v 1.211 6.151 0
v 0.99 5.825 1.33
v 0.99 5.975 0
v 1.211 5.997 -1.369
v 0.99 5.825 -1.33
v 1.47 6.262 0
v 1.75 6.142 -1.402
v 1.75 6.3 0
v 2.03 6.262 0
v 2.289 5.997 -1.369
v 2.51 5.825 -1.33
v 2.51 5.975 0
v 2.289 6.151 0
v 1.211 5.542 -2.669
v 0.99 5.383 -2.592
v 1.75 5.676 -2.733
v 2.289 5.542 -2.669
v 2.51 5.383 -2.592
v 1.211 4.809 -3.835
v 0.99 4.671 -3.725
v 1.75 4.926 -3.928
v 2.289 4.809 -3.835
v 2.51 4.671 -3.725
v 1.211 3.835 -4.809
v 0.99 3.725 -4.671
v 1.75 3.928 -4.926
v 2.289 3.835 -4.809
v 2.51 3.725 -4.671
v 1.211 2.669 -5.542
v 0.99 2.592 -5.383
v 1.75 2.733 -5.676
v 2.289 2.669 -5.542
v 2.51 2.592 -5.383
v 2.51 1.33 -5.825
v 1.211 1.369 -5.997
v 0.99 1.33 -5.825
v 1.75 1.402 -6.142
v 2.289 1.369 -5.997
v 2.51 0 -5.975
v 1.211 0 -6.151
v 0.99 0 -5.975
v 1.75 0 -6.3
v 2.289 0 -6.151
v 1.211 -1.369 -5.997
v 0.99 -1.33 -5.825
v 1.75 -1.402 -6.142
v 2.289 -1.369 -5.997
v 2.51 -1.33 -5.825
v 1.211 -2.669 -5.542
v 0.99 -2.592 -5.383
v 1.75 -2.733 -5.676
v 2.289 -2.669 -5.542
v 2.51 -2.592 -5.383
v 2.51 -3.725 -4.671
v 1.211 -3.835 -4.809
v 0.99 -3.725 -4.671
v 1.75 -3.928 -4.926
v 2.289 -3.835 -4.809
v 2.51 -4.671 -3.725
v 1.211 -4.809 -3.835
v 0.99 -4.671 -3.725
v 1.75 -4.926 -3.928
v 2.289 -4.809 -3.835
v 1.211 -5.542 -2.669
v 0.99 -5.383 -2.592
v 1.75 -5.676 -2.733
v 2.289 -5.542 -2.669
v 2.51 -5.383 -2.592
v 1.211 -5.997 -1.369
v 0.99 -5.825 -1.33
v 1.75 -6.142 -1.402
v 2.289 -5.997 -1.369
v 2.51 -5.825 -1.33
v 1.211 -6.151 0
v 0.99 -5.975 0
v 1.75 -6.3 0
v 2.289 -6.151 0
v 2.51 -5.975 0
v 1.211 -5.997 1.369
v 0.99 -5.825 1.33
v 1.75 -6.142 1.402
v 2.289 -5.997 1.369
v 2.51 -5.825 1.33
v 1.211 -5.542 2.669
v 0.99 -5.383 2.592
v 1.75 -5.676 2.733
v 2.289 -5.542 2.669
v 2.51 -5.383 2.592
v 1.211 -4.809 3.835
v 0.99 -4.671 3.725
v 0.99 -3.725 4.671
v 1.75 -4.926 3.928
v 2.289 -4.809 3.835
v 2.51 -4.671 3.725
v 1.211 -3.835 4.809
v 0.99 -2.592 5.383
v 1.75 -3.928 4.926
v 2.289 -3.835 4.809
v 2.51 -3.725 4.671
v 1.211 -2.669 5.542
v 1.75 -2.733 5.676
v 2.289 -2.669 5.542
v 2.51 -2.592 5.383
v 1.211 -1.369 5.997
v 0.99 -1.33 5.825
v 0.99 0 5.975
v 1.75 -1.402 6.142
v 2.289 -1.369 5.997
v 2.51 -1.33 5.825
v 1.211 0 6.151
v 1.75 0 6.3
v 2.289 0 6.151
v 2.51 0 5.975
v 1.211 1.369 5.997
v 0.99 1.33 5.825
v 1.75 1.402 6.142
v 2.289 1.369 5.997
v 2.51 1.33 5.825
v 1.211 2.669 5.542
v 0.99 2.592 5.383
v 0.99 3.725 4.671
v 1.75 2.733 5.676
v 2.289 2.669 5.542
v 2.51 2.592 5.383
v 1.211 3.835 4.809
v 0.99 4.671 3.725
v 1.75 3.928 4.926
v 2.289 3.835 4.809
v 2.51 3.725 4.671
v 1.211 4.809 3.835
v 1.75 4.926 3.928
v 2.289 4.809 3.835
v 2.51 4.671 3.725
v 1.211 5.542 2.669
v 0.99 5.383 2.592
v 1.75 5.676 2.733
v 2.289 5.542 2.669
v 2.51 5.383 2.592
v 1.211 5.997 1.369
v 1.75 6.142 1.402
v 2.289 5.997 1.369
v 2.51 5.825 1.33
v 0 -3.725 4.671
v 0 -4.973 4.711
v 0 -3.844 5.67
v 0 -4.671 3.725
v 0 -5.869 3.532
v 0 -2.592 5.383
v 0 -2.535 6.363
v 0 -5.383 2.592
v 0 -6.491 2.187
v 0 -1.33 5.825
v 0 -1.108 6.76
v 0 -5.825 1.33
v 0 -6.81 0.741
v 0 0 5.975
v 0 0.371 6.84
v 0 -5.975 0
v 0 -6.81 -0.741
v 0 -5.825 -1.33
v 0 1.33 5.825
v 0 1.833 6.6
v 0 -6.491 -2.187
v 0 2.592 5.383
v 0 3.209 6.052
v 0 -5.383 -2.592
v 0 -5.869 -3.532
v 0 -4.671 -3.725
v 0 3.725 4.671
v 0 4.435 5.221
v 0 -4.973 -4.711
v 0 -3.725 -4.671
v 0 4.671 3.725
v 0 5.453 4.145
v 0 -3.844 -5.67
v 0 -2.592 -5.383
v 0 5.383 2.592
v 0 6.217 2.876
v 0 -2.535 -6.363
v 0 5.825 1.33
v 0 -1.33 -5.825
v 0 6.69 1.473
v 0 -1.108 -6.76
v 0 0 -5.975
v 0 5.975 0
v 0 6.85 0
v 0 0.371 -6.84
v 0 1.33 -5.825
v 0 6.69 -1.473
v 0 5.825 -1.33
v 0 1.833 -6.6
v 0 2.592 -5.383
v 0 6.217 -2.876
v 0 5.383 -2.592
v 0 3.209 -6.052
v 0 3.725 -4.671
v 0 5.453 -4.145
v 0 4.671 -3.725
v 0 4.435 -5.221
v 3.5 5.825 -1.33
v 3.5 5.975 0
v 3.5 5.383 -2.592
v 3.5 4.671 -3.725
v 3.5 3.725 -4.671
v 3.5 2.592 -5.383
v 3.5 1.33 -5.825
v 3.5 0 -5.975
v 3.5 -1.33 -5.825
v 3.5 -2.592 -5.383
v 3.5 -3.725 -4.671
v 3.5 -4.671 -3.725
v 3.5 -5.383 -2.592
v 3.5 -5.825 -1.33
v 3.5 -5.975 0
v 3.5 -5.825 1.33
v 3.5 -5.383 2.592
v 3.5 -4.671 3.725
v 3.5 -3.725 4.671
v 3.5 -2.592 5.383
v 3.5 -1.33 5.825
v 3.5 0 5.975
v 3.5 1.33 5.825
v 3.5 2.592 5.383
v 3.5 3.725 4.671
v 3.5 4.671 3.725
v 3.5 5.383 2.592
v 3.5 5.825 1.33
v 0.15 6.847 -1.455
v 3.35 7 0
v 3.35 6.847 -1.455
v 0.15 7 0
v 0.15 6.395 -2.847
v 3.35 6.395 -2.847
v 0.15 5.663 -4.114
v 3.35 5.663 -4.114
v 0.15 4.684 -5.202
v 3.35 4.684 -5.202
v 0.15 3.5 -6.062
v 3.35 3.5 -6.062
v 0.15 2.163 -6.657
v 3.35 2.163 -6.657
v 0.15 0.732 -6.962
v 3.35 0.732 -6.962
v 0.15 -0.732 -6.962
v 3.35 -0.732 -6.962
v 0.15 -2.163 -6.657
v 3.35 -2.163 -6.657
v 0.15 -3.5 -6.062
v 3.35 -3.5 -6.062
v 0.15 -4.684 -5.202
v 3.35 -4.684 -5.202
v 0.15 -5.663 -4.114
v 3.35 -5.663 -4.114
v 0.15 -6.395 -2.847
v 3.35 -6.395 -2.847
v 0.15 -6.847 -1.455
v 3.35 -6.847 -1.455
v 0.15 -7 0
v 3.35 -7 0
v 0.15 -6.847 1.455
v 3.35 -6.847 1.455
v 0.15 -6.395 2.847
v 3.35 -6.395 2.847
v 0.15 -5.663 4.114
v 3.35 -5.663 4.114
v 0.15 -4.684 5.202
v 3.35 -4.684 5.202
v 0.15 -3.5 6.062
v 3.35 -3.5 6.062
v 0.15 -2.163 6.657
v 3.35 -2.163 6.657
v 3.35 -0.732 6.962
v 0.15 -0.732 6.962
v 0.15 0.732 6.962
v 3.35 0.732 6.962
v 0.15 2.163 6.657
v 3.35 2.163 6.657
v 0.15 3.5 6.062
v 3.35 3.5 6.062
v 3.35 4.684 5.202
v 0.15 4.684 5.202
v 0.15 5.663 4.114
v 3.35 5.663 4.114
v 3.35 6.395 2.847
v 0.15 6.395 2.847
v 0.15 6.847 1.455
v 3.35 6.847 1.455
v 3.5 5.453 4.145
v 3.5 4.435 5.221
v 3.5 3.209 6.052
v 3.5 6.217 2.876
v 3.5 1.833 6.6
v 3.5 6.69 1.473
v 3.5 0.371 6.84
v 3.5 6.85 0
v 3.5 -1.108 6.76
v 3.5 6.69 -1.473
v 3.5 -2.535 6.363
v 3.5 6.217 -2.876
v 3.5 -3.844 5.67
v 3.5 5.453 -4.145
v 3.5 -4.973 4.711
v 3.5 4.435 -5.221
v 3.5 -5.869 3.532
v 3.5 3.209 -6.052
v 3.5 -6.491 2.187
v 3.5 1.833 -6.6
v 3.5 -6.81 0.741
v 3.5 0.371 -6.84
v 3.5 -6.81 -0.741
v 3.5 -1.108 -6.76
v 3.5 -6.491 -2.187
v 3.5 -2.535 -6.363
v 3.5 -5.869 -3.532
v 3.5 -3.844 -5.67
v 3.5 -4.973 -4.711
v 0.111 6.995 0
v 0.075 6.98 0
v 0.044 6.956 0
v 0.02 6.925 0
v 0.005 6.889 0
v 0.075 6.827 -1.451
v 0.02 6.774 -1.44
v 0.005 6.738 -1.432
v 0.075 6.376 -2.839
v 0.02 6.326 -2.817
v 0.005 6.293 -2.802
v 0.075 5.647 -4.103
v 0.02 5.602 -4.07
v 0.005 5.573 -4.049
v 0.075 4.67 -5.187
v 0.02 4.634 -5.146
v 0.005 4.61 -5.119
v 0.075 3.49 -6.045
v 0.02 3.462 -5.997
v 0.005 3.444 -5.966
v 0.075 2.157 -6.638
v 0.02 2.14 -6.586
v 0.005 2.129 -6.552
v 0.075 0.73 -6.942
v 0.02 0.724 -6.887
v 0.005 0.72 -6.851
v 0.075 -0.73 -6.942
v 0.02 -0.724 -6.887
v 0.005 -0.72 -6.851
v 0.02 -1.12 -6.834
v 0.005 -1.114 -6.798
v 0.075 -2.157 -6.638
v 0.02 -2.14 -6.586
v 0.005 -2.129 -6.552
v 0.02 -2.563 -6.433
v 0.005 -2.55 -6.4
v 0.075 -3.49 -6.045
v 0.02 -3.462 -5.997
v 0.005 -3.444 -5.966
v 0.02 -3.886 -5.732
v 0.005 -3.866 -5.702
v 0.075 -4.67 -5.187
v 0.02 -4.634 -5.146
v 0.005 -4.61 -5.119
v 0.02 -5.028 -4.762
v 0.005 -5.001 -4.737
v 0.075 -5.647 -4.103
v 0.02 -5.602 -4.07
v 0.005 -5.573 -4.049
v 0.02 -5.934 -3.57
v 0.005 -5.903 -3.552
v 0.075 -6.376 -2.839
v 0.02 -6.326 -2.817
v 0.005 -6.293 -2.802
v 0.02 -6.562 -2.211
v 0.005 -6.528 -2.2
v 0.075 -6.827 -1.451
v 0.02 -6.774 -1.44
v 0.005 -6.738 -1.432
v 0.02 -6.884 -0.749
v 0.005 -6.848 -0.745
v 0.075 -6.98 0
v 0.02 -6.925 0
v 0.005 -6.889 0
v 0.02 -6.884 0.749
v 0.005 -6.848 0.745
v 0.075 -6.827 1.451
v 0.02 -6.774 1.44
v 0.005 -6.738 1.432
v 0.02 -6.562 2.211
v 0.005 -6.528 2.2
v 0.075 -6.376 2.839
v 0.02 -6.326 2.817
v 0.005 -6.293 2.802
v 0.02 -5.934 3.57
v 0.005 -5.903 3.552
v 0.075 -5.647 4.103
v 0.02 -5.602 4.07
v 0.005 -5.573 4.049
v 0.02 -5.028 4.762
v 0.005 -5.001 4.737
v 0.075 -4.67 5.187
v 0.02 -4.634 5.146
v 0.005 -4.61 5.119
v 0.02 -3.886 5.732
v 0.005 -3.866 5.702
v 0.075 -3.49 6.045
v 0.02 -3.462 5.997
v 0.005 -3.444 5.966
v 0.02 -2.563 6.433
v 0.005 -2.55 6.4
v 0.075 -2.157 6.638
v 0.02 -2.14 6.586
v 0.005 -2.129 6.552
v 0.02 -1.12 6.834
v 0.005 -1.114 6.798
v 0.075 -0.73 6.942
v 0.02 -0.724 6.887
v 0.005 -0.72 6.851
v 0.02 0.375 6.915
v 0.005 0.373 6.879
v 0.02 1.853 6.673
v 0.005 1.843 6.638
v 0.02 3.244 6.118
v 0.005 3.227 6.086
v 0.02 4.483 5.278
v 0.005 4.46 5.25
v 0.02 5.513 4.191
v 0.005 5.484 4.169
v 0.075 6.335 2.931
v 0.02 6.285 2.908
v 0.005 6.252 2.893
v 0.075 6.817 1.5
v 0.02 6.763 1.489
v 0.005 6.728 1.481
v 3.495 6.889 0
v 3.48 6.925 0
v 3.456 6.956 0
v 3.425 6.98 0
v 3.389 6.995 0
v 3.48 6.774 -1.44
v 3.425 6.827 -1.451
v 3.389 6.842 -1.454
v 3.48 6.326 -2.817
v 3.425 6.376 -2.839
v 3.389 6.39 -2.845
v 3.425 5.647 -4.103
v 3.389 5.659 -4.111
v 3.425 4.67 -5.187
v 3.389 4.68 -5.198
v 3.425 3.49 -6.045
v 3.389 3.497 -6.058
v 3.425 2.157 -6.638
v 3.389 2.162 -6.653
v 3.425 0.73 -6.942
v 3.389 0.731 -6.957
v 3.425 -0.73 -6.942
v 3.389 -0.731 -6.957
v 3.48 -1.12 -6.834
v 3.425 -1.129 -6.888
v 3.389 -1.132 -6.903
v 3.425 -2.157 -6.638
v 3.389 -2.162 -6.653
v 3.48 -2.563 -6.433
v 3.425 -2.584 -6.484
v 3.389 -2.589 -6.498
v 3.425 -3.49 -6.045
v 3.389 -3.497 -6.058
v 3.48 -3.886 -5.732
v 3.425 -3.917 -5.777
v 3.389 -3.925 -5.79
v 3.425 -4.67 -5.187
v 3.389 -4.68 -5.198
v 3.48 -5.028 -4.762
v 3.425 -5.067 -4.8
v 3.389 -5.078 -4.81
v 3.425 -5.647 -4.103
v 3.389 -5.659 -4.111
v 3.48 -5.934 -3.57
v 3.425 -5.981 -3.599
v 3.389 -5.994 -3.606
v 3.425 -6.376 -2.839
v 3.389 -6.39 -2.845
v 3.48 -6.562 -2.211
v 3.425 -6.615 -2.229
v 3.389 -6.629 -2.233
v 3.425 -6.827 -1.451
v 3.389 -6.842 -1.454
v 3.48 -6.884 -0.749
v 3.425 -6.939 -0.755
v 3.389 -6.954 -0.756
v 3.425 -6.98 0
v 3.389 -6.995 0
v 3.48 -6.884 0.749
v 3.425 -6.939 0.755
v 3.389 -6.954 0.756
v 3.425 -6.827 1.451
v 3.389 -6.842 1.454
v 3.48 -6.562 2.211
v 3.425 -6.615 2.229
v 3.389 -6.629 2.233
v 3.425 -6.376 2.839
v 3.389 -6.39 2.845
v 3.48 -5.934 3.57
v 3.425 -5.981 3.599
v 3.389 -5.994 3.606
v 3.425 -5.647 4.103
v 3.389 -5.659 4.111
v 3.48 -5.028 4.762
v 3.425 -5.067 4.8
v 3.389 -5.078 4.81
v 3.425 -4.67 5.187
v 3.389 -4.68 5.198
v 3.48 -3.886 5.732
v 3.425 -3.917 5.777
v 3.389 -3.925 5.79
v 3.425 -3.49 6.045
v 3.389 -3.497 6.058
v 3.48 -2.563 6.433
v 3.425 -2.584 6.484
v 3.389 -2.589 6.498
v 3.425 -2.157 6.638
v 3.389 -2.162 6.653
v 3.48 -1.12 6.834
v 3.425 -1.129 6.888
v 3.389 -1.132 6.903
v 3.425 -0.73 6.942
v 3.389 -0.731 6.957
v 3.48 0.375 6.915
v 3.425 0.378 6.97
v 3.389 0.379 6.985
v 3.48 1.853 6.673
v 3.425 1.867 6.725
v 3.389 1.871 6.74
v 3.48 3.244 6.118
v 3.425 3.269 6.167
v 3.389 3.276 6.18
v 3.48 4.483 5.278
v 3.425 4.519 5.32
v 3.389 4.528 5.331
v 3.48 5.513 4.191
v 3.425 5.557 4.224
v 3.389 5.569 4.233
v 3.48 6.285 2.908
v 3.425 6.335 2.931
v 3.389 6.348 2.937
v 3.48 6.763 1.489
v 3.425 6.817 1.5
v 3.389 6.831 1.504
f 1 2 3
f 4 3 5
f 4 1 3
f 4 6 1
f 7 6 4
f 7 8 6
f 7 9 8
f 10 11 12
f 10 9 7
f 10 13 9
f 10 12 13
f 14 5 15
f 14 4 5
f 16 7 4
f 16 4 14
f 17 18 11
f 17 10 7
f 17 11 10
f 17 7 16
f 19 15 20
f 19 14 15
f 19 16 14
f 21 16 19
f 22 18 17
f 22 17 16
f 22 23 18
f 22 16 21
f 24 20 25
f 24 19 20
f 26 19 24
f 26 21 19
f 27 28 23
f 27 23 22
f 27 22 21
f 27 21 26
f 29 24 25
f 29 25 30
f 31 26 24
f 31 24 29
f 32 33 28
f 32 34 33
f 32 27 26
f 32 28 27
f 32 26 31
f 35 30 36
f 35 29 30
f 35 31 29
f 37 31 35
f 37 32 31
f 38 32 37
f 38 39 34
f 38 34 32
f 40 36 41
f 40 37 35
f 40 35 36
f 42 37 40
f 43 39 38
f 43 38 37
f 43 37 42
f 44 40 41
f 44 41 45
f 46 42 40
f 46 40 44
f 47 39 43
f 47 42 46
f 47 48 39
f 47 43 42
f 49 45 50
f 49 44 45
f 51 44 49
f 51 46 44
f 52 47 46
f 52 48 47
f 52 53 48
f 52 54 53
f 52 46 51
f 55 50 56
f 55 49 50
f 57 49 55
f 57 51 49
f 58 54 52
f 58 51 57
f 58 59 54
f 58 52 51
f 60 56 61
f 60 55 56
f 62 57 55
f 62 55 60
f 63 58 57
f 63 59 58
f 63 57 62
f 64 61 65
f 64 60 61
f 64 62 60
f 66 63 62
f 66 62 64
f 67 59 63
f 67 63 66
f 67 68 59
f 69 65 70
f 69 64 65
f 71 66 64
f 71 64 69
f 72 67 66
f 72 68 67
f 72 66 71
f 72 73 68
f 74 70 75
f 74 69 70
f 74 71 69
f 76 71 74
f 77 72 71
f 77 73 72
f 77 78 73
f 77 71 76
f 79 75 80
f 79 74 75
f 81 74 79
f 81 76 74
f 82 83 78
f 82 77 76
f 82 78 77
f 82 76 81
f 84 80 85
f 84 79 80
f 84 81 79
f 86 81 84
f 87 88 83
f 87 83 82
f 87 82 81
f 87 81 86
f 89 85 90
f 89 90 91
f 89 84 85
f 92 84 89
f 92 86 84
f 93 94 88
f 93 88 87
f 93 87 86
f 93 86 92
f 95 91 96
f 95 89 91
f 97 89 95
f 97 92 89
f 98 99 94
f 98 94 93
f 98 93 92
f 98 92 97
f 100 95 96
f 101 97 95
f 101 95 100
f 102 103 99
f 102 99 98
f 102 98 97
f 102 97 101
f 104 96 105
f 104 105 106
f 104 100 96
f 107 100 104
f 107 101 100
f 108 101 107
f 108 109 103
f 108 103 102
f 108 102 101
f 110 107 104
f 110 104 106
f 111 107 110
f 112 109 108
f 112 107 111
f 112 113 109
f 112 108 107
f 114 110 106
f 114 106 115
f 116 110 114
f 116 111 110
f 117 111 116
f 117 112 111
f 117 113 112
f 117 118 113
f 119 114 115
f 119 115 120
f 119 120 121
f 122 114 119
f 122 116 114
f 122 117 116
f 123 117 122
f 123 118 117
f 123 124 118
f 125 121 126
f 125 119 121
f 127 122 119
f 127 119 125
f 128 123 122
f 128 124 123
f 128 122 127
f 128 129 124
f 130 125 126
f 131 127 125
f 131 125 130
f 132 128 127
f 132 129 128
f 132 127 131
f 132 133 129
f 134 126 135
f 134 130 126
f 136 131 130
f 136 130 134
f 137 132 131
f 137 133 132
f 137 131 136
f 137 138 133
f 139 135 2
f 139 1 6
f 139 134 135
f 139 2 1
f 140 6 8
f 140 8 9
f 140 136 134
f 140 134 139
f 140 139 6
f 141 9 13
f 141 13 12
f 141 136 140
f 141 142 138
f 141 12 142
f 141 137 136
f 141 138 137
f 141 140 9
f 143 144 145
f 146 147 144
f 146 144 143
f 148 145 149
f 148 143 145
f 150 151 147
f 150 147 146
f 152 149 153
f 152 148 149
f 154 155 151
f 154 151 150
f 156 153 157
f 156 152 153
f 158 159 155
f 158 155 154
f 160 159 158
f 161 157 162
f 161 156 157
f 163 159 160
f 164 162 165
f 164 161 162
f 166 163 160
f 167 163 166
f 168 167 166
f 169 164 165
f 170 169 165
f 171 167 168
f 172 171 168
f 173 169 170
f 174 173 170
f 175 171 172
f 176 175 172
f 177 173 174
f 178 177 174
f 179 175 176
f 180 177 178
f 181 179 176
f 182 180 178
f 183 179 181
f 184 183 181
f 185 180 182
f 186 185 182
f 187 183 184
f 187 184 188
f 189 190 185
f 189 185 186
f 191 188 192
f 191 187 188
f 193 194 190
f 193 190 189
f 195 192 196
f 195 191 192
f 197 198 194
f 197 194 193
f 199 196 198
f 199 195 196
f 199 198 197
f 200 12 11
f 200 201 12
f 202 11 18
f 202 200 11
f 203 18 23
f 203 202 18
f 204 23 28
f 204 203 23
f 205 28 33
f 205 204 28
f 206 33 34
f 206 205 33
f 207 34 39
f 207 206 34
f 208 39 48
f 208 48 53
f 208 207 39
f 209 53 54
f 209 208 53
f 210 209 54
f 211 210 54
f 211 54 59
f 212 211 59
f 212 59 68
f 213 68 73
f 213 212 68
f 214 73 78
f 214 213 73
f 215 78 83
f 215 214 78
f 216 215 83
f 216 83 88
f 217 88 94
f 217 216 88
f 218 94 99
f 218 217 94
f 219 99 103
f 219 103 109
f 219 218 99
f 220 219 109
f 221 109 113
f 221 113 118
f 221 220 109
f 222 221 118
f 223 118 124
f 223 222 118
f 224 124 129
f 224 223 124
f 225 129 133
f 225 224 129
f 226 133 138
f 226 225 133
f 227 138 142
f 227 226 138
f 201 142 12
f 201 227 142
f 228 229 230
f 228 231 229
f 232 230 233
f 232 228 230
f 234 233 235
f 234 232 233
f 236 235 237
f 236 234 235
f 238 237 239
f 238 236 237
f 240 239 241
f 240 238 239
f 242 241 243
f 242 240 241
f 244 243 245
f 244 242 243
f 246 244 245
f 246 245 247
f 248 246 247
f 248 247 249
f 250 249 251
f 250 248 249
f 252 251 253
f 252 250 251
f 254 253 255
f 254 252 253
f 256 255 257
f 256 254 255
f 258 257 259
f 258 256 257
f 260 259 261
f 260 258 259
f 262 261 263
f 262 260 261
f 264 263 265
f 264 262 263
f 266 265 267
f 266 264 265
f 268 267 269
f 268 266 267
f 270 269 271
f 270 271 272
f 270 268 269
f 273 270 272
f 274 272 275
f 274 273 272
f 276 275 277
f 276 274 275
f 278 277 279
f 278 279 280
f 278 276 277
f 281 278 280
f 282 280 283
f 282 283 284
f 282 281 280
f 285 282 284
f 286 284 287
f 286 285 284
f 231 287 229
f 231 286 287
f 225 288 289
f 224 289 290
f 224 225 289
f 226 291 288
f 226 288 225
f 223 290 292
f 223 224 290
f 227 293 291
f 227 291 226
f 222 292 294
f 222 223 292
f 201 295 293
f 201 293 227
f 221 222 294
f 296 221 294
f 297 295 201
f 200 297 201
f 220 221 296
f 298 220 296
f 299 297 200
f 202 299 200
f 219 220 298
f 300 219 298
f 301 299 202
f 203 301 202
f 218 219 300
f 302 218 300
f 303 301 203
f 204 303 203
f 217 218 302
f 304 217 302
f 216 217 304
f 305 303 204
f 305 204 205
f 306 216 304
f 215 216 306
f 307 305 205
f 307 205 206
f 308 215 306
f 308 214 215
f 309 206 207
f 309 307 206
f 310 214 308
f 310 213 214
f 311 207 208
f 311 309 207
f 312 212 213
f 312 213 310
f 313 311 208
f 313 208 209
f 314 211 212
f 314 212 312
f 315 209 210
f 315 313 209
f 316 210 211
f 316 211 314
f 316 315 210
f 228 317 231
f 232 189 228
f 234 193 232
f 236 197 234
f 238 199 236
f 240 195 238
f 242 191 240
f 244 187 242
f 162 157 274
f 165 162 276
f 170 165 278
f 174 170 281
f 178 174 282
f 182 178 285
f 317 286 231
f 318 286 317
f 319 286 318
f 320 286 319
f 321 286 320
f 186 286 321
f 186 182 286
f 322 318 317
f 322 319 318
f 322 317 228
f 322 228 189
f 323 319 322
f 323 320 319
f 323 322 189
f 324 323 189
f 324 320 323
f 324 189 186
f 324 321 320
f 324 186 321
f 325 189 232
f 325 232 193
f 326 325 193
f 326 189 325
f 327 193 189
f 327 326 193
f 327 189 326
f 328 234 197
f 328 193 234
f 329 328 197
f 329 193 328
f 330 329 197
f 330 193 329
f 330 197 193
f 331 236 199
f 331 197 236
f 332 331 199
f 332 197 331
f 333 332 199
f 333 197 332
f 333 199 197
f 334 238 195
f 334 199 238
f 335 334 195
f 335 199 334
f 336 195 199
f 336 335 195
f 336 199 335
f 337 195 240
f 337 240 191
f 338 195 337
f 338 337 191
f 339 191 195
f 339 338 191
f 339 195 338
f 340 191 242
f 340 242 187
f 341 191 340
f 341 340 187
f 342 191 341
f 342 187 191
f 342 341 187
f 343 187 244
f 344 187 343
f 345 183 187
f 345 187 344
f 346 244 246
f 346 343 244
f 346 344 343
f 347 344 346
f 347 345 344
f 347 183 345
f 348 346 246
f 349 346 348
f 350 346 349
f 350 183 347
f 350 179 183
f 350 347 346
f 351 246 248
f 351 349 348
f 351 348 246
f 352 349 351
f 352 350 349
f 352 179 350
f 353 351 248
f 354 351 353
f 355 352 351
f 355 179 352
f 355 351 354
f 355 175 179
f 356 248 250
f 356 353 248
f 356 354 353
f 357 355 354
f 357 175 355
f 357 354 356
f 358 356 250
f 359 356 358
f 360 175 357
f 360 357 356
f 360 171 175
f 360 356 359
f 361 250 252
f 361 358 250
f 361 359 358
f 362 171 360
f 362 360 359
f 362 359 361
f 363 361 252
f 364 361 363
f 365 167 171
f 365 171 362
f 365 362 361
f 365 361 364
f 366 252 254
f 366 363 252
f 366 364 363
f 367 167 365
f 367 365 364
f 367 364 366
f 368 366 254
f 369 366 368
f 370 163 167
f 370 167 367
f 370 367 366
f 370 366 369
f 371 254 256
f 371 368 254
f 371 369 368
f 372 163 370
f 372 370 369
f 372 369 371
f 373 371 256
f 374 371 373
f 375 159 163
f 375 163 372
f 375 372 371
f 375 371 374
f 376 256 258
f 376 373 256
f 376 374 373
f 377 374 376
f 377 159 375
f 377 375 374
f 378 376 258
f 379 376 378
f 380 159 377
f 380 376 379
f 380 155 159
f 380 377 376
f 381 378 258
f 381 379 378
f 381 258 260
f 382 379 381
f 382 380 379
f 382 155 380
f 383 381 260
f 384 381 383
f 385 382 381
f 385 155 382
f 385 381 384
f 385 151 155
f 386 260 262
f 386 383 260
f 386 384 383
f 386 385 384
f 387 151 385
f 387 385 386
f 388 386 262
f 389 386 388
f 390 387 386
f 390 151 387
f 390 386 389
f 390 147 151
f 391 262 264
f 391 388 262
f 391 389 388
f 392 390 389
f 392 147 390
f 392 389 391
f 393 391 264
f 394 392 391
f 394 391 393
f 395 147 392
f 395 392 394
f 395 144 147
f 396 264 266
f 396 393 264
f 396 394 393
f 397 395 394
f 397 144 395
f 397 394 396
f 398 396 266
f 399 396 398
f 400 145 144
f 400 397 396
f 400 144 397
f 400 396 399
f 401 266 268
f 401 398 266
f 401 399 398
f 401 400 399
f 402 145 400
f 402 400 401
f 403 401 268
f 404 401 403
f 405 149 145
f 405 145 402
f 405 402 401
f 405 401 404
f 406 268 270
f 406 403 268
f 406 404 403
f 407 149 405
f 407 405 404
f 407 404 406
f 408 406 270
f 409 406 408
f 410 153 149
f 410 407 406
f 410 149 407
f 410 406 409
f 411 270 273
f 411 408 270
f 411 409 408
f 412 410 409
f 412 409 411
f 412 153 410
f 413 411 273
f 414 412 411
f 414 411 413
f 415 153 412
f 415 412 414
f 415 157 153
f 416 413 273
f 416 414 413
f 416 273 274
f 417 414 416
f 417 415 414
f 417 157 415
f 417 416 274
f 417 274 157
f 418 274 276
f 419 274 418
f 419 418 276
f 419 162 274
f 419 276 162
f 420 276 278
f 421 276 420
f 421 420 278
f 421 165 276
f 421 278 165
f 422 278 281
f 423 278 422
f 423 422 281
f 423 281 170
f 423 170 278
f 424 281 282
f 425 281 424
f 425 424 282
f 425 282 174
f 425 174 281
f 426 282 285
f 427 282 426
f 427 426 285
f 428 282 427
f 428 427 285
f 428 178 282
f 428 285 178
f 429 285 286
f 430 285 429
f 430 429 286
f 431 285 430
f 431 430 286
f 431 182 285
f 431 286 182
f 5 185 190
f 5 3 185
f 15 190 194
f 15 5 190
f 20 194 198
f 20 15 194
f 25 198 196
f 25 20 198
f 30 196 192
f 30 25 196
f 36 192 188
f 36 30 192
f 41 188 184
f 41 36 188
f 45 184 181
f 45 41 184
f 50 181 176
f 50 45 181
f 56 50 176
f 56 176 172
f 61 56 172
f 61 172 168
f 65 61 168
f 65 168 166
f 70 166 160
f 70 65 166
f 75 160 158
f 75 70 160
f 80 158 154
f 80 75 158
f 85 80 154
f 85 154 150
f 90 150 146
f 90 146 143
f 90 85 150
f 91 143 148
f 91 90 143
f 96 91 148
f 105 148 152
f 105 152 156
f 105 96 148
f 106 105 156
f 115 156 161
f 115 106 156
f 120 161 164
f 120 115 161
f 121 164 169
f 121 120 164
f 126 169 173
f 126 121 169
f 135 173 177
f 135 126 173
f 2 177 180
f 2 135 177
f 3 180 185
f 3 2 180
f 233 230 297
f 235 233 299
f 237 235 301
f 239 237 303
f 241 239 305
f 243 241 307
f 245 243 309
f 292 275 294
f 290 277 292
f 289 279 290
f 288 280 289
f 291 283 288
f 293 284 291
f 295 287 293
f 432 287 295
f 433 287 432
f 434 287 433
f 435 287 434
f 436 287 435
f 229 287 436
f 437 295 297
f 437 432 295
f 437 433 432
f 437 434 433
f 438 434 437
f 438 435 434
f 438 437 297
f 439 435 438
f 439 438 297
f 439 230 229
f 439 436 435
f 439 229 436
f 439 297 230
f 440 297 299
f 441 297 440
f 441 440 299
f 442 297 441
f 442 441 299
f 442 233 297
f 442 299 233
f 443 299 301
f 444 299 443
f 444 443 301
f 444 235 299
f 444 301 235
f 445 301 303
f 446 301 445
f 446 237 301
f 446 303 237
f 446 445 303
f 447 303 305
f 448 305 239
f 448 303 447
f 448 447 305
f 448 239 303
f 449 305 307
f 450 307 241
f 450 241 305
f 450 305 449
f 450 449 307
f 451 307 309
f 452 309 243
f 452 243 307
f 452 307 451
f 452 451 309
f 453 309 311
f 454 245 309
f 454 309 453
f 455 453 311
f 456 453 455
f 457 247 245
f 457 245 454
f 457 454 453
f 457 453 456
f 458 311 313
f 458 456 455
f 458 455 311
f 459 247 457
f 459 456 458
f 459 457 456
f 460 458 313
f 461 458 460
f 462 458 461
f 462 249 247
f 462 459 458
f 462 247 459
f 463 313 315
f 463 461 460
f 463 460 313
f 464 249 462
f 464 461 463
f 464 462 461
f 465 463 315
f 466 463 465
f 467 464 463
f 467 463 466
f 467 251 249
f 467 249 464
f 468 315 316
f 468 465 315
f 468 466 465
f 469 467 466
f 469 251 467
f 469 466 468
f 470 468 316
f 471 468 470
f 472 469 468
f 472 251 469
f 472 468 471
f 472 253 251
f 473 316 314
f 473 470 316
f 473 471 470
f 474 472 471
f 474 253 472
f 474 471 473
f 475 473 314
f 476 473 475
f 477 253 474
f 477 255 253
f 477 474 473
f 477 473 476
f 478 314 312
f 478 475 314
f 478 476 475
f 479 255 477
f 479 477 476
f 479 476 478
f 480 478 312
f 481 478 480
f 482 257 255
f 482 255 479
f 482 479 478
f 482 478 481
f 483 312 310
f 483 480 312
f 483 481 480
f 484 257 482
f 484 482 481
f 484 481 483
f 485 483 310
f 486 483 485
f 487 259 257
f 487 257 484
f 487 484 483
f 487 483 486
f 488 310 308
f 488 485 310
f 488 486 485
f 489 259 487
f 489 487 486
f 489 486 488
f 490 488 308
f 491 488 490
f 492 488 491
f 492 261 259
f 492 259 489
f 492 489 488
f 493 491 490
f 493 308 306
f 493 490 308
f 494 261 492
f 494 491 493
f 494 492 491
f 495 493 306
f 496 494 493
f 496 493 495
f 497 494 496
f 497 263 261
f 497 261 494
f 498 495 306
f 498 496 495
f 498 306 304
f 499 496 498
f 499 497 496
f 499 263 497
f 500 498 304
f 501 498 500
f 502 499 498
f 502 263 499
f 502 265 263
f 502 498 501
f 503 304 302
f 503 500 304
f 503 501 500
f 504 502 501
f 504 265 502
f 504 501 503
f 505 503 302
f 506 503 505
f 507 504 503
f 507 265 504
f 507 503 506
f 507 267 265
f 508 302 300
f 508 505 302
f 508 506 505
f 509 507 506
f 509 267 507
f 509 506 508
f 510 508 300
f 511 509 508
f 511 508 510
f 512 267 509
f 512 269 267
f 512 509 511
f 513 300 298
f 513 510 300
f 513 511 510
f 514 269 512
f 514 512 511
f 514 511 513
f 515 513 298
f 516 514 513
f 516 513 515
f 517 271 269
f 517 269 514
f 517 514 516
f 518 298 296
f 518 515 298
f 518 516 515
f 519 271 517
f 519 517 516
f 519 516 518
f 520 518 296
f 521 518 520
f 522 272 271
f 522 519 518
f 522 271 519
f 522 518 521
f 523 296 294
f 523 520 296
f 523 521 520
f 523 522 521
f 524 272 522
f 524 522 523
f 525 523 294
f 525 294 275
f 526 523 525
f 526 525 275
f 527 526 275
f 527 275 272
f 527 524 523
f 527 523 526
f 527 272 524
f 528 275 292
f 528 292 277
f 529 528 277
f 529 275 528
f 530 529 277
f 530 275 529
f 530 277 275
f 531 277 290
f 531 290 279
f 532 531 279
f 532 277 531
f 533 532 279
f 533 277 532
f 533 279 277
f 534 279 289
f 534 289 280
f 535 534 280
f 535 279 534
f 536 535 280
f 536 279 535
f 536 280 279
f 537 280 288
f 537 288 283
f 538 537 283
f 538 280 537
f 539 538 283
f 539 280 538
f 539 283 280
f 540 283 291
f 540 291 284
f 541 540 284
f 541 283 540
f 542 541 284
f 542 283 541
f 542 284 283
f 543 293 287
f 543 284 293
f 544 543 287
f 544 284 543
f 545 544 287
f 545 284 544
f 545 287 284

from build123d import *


with BuildPart() as part:
    # Sketch1 → Revolve1 (revolve)
    with BuildSketch(Plane.XY):
        with BuildLine():
            Line((0, 6.85), (0, 5.975))
            Line((0, 5.975), (0.990477123, 5.975))
            ThreePointArc((0.990477123, 5.975), (1.75, 6.3), (2.509522877, 5.975))
            Line((2.509522877, 5.975), (3.5, 5.975))
            Line((3.5, 5.975), (3.5, 6.85))
            ThreePointArc((3.5, 6.85), (3.456066017, 6.956066017), (3.35, 7))
            Line((3.35, 7), (0.15, 7))
            ThreePointArc((0.15, 7), (0.043933983, 6.956066017), (0, 6.85))
        make_face()
    revolve(axis=Axis((3.5, 0, 0), (-1, 0, 0)))


solid = part.part
